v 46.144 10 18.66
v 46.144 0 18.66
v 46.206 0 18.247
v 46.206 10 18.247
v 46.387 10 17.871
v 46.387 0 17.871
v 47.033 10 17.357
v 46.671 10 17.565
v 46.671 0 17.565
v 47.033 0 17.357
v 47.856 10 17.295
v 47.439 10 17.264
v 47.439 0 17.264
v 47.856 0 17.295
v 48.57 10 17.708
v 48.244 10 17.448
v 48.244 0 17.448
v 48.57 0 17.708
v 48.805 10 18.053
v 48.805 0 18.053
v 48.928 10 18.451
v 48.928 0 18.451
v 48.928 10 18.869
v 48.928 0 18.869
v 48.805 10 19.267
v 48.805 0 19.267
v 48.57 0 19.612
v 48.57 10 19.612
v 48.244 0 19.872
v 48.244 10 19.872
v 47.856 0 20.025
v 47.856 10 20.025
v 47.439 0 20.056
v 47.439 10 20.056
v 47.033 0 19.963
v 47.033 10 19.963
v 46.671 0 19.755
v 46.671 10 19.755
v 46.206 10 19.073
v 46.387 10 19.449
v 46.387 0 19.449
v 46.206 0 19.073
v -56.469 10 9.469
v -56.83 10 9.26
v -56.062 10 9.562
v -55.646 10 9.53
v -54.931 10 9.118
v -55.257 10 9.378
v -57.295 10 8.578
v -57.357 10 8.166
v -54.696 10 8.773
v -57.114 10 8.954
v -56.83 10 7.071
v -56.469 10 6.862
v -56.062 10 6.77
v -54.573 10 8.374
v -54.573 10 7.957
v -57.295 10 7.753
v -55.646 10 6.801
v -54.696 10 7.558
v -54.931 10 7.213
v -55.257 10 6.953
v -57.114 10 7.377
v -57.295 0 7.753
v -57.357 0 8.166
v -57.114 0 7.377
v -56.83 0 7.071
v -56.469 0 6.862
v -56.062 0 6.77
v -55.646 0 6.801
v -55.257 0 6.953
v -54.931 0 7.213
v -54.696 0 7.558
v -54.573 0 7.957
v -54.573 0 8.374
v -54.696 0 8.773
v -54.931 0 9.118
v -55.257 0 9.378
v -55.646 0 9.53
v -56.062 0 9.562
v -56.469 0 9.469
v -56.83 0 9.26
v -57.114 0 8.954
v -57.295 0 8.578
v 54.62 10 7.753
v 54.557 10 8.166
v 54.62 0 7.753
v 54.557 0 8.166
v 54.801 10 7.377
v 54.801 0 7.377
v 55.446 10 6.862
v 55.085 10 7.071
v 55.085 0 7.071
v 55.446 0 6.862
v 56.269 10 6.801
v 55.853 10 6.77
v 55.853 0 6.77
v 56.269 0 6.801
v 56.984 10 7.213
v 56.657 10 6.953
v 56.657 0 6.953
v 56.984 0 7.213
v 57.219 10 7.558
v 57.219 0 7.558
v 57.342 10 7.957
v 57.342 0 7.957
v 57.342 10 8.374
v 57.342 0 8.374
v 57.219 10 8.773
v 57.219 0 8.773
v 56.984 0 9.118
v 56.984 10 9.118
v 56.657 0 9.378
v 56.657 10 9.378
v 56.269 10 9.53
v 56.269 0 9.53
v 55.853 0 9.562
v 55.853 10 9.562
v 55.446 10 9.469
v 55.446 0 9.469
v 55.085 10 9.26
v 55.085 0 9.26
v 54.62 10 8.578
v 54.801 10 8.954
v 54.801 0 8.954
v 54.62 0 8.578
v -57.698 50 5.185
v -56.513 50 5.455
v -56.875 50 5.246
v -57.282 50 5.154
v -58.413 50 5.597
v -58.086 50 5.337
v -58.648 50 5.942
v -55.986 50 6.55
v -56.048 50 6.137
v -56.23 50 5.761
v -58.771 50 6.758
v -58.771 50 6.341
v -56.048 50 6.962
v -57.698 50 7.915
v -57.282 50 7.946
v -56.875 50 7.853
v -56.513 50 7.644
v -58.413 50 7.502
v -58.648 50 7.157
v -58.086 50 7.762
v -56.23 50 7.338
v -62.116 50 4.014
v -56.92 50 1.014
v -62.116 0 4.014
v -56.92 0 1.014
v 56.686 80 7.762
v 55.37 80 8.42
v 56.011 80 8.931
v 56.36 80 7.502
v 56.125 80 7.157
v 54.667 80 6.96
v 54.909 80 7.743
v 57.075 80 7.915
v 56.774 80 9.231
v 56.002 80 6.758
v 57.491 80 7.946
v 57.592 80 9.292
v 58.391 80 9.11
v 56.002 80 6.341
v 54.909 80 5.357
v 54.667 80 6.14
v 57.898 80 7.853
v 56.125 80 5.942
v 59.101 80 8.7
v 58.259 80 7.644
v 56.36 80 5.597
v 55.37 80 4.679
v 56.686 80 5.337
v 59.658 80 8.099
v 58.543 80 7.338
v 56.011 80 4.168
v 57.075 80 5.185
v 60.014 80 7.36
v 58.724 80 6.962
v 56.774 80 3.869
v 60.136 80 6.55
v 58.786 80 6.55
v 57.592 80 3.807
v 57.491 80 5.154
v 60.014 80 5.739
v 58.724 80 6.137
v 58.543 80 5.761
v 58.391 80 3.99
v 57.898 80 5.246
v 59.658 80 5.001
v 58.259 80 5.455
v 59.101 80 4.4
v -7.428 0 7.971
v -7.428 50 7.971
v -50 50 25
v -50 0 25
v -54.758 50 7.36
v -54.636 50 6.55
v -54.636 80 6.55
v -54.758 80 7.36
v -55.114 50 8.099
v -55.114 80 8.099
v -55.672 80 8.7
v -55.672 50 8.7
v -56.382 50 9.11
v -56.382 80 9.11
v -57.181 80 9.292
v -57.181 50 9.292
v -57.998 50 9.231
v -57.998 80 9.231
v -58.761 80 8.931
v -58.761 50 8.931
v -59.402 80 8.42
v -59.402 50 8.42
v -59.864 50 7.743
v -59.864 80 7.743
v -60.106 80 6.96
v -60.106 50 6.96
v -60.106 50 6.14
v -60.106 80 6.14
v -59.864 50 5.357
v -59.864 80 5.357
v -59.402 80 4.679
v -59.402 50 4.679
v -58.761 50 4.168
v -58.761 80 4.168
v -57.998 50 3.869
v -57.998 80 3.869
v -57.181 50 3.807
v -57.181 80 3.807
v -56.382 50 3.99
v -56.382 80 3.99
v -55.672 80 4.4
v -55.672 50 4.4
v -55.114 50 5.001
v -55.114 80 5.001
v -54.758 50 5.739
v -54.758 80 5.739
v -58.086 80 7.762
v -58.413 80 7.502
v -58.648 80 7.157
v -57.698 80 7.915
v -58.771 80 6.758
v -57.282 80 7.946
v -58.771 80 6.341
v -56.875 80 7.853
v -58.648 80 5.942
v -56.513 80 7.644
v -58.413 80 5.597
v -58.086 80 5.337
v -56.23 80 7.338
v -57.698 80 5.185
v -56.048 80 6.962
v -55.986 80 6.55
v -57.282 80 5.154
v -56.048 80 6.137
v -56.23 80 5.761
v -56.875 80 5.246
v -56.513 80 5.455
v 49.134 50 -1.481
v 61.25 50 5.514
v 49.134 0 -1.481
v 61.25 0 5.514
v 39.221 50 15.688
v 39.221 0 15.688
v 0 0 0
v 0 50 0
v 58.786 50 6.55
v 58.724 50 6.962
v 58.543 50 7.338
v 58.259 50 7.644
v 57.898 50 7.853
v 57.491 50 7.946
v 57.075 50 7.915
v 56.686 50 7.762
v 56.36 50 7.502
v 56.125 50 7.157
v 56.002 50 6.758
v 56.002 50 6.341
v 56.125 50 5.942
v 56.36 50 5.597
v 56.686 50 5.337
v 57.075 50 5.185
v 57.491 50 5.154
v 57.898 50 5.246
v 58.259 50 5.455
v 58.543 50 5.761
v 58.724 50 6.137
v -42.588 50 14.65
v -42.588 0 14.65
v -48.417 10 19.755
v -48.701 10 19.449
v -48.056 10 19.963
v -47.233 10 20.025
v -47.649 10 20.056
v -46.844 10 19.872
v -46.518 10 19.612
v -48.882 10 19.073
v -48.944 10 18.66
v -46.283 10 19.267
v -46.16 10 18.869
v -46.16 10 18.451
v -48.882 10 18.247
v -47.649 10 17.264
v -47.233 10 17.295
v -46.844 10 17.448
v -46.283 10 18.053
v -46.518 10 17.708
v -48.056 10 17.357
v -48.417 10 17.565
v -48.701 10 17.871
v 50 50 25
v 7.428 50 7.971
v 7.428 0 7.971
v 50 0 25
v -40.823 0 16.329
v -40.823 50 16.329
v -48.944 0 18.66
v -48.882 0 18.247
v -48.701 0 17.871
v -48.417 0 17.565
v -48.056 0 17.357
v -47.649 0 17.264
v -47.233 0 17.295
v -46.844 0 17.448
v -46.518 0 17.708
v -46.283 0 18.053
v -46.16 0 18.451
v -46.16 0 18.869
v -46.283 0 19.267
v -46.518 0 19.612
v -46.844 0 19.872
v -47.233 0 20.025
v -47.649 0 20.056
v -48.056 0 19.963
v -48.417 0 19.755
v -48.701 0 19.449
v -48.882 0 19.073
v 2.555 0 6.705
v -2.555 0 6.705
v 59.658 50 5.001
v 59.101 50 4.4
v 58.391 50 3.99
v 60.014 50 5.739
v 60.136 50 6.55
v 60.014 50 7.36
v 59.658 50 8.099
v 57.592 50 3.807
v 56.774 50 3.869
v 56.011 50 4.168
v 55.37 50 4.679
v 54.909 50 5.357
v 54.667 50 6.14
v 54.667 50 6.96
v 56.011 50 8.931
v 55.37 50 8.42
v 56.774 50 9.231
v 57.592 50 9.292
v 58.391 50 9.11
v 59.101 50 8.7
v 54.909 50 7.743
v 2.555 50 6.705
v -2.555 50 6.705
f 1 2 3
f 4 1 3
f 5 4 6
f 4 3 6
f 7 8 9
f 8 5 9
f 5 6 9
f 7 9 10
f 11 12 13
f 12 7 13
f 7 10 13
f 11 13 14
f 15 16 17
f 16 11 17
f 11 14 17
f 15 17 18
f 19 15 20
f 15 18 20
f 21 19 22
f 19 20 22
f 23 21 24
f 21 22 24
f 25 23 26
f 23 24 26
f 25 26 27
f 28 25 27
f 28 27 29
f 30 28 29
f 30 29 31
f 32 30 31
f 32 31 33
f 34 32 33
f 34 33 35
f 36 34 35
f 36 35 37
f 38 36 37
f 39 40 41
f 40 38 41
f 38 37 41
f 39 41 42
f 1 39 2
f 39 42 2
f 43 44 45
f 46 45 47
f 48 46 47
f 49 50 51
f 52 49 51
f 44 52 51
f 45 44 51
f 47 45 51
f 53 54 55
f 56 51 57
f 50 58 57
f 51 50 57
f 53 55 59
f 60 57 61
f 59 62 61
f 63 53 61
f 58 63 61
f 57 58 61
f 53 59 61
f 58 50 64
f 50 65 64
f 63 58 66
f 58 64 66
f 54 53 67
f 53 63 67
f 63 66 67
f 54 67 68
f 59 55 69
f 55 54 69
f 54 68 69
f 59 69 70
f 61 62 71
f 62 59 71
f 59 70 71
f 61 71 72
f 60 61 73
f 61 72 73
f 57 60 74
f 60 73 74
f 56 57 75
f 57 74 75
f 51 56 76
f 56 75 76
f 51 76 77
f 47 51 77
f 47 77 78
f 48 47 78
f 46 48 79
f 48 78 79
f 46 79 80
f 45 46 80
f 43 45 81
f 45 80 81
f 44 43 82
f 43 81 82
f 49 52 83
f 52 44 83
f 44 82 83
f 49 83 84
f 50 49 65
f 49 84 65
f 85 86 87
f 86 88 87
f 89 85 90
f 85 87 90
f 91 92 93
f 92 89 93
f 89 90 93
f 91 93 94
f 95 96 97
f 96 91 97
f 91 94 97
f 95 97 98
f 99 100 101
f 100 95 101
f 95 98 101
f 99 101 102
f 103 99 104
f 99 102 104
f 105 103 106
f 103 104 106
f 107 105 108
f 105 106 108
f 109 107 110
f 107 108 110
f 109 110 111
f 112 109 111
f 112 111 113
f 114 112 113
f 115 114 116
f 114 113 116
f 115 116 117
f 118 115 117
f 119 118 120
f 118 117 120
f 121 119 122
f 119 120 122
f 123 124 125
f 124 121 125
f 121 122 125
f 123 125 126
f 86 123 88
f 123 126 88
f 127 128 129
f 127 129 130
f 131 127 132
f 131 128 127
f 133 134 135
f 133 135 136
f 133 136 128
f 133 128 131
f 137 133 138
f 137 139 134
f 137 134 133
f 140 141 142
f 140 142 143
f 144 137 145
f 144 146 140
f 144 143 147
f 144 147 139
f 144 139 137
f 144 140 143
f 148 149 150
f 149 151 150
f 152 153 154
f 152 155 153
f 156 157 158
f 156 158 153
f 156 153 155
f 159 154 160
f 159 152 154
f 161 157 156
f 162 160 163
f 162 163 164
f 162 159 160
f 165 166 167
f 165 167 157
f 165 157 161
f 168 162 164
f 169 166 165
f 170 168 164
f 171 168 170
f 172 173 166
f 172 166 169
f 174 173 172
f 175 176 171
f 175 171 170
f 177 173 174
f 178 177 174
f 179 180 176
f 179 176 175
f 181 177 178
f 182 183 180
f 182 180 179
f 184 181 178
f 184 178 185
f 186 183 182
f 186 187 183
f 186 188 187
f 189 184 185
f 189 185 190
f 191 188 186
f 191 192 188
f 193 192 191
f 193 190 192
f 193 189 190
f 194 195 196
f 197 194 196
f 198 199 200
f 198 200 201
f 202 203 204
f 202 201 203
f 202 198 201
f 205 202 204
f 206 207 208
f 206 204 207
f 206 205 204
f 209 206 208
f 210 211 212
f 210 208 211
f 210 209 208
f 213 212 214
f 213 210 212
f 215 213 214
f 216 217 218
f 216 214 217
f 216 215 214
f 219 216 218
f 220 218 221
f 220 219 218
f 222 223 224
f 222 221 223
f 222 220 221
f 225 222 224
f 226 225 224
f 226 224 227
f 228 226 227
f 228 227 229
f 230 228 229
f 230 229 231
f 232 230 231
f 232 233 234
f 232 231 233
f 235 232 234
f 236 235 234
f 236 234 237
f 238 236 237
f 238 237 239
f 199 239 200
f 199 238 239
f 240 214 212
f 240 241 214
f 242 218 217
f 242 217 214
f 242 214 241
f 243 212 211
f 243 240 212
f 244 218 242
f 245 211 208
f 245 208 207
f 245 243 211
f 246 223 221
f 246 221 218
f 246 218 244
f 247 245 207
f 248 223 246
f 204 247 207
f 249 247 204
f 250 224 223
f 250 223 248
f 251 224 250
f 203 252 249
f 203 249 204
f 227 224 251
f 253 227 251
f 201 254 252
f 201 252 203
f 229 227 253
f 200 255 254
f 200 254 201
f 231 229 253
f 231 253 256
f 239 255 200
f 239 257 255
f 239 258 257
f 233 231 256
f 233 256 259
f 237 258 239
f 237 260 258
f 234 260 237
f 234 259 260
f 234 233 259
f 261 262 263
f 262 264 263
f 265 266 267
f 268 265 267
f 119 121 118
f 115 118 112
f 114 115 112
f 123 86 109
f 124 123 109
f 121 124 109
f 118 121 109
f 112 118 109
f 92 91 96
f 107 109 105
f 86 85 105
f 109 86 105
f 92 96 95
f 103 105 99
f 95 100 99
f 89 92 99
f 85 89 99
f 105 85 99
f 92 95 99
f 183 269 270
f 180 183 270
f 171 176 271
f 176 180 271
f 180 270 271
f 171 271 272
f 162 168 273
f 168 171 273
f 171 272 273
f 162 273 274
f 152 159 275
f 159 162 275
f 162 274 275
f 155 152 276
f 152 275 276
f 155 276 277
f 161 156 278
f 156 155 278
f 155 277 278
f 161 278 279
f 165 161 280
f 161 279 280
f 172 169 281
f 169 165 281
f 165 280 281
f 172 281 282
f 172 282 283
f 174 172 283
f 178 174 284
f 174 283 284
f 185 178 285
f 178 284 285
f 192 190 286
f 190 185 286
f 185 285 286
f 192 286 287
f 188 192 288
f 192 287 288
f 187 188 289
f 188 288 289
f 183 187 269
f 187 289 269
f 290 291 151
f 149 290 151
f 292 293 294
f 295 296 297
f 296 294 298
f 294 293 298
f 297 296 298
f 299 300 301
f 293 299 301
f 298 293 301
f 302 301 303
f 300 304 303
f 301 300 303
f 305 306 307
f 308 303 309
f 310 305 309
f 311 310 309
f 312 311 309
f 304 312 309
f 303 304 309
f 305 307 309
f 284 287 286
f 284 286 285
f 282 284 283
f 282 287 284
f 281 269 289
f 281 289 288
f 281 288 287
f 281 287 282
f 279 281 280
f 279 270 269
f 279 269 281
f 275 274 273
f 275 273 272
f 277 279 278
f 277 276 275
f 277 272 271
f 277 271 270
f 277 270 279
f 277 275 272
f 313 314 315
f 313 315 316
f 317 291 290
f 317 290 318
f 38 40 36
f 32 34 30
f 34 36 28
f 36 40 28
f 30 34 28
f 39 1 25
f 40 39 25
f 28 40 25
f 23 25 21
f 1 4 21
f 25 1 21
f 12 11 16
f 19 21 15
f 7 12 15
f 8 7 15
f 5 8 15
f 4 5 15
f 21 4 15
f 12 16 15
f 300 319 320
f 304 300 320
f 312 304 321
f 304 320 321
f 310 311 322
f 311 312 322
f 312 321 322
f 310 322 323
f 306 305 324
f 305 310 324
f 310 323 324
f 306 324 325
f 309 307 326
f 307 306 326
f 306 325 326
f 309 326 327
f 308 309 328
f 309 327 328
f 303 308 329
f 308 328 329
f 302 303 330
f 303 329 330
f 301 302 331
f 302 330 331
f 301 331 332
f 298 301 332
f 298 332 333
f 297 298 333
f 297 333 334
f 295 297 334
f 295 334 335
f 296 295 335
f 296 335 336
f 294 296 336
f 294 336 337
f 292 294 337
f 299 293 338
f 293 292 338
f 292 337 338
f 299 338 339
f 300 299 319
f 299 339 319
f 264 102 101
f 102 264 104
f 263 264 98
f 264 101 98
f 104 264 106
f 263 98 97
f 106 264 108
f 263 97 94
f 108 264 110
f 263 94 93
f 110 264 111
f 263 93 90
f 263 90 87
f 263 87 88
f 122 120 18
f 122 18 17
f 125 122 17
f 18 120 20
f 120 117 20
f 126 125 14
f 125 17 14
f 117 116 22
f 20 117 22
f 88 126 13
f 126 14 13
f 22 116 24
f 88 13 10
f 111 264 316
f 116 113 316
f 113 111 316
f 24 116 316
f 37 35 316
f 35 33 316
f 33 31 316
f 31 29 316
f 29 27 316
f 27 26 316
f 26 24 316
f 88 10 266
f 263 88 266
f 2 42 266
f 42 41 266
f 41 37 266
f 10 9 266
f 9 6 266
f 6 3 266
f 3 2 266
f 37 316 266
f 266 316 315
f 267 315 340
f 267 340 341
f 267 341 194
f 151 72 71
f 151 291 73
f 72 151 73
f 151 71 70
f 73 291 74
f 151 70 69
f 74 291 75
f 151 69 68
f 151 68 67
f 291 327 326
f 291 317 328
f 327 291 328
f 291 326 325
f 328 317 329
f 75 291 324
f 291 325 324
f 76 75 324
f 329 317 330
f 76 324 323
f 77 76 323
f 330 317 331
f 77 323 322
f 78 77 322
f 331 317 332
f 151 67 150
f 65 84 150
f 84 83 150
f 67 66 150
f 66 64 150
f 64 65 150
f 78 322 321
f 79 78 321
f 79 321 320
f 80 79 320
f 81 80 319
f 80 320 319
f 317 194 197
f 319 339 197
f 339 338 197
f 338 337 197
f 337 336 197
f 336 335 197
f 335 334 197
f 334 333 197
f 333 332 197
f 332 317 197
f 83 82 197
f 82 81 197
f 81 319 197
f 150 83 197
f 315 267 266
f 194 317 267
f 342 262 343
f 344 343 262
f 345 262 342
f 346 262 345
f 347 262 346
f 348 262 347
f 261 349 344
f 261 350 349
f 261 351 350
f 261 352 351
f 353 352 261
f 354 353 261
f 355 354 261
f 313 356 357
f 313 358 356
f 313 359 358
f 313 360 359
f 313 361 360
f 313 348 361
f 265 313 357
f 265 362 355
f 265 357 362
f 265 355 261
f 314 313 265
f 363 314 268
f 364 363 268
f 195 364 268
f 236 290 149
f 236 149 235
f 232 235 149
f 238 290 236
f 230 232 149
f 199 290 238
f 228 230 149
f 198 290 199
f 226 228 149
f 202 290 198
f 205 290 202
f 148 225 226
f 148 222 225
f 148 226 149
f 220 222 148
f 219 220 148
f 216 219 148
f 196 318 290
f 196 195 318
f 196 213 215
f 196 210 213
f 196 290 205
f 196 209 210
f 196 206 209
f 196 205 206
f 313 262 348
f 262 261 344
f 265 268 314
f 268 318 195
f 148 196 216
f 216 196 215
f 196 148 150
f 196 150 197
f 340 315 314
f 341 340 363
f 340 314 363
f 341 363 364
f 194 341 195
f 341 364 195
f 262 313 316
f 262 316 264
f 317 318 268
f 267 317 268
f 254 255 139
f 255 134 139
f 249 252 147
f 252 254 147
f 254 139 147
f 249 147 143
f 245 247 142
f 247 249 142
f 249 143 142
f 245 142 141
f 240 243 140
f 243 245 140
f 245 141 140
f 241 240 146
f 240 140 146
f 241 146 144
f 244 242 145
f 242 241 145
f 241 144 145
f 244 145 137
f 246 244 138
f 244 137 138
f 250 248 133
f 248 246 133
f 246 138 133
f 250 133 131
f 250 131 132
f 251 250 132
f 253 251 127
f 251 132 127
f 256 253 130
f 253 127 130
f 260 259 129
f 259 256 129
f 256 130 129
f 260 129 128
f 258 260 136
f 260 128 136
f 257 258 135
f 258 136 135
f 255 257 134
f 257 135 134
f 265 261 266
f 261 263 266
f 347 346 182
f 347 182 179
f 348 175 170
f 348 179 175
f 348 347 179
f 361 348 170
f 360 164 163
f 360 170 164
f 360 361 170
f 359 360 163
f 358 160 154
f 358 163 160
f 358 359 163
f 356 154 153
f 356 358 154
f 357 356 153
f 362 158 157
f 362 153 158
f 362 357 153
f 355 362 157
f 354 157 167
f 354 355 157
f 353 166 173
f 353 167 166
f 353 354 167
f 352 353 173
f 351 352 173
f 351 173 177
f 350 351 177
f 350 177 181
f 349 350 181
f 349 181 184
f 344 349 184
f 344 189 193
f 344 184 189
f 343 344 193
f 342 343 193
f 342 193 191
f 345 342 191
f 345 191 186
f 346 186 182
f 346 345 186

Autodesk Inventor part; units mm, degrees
ref_plane "YZ Plane" through (0, 0, 0) normal (1, 0, 0) x (0, 1, 0)
ref_plane "XZ Plane" through (0, 0, 0) normal (0, 1, 0) x (-1, 0, 0)
ref_plane "XY Plane" through (0, 0, 0) normal (0, 0, 1) x (1, 0, 0)
sketch "Sketch1" plane through (0, 0, 0) normal (0, 1, 0) x (-1, 0, 0)
  line L0 (56.9199, 1.0144) -> (62.116, 4.0144)
  line L1 (62.116, 4.0144) -> (50, 25)
  line L2 (-50, 25) -> (-61.25, 5.5144)
  line L3 (0.7428, 5.2971) -> (50, 25)
  line L4 (-0.7428, 5.2971) -> (-50, 25)
  line L5 (42.5883, 14.6502) -> (56.9199, 1.0144)
  line L6 (-0.7428, 5.2971) -> (0, 5)
  line L7 (0.7428, 5.2971) -> (0, 5)
  circle A0 centre (47.5441, 18.66) radius 1.4
  circle A1 centre (55.9574, 8.1656) radius 1.4
  circle A2 centre (-55.9574, 8.1656) radius 1.4
  circle A3 centre (-47.5441, 18.66) radius 1.4
  line L8 (-39.2213, 15.6885) -> (0, 0)
  line L9 (42.5883, 14.6502) -> (40.8234, 16.3294)
  line L10 (40.8234, 16.3294) -> (0, 0)
  line L11 (-61.25, 5.5144) -> (-49.134, -1.4808)
  line L12 (-49.134, -1.4808) -> (-39.2213, 15.6885)
  point P0 (0, 0)
  dimension "d0" = 2.8
  dimension "d1" = 2.8
  dimension "d2" = 2.8
  dimension "d3" = 2.8
  dimension "d14" = 5
extrude "Extrusion1" add sketch "Sketch1" along normal blind 50
sketch "Sketch2" plane through (0, 50, 0) normal (0, 1, 0) x (1, 0, 0)
  circle A0 centre (47.5441, -18.66) radius 1.4 projected
  circle A1 centre (55.9574, -8.1656) radius 1.4 projected
  circle A2 centre (-55.9574, -8.1656) radius 1.4 projected
  circle A3 centre (-47.5441, -18.66) radius 1.4 projected
  line L0 (-40.8234, -16.3294) -> (-56.9199, -1.0144) projected
  line L1 (-56.9199, -1.0144) -> (-62.116, -4.0144) projected
  line L2 (-62.116, -4.0144) -> (-50, -25) projected
  line L3 (-50, -25) -> (0, -5) projected
  line L4 (0, -5) -> (50, -25) projected
  line L5 (50, -25) -> (61.25, -5.5144) projected
  line L6 (39.2213, -15.6885) -> (0, 0) projected
  line L7 (0, 0) -> (-40.8234, -16.3294) projected
  line L8 (61.25, -5.5144) -> (49.134, 1.4808) projected
  line L9 (49.134, 1.4808) -> (39.2213, -15.6885) projected
  point P0 (0, 0)
extrude "Extrusion2" add sketch "Sketch2" against normal blind 40 contours A0 | A1 | A2 | A3
sketch "Sketch3" plane through (0, 50, 0) normal (0, 1, 0) x (1, 0, 0)
  line L0 (-62.116, -4.0144) -> (-58.116, -4.0144) construction
  circle A0 centre (-57.3863, -6.5497) radius 1.4
  line L1 (61.25, -5.5144) -> (57.25, -5.5144) construction
  circle A1 centre (57.3863, -6.5497) radius 1.4
  circle A2 centre (57.3863, -6.5497) radius 2.75
  circle A3 centre (-57.3863, -6.5497) radius 2.75
  point P0 (0, 0)
  dimension "d10" = 2.8
  dimension "d15" = 2.8
  dimension "d16" = 5.5
  dimension "d17" = 5.5
extrude "Extrusion3" add sketch "Sketch3" along normal blind 30
fillet "Fillet1" radius 20 1 edges at (0, 25, 5)
properties part number "Front Support" material "ABS Plastic"
